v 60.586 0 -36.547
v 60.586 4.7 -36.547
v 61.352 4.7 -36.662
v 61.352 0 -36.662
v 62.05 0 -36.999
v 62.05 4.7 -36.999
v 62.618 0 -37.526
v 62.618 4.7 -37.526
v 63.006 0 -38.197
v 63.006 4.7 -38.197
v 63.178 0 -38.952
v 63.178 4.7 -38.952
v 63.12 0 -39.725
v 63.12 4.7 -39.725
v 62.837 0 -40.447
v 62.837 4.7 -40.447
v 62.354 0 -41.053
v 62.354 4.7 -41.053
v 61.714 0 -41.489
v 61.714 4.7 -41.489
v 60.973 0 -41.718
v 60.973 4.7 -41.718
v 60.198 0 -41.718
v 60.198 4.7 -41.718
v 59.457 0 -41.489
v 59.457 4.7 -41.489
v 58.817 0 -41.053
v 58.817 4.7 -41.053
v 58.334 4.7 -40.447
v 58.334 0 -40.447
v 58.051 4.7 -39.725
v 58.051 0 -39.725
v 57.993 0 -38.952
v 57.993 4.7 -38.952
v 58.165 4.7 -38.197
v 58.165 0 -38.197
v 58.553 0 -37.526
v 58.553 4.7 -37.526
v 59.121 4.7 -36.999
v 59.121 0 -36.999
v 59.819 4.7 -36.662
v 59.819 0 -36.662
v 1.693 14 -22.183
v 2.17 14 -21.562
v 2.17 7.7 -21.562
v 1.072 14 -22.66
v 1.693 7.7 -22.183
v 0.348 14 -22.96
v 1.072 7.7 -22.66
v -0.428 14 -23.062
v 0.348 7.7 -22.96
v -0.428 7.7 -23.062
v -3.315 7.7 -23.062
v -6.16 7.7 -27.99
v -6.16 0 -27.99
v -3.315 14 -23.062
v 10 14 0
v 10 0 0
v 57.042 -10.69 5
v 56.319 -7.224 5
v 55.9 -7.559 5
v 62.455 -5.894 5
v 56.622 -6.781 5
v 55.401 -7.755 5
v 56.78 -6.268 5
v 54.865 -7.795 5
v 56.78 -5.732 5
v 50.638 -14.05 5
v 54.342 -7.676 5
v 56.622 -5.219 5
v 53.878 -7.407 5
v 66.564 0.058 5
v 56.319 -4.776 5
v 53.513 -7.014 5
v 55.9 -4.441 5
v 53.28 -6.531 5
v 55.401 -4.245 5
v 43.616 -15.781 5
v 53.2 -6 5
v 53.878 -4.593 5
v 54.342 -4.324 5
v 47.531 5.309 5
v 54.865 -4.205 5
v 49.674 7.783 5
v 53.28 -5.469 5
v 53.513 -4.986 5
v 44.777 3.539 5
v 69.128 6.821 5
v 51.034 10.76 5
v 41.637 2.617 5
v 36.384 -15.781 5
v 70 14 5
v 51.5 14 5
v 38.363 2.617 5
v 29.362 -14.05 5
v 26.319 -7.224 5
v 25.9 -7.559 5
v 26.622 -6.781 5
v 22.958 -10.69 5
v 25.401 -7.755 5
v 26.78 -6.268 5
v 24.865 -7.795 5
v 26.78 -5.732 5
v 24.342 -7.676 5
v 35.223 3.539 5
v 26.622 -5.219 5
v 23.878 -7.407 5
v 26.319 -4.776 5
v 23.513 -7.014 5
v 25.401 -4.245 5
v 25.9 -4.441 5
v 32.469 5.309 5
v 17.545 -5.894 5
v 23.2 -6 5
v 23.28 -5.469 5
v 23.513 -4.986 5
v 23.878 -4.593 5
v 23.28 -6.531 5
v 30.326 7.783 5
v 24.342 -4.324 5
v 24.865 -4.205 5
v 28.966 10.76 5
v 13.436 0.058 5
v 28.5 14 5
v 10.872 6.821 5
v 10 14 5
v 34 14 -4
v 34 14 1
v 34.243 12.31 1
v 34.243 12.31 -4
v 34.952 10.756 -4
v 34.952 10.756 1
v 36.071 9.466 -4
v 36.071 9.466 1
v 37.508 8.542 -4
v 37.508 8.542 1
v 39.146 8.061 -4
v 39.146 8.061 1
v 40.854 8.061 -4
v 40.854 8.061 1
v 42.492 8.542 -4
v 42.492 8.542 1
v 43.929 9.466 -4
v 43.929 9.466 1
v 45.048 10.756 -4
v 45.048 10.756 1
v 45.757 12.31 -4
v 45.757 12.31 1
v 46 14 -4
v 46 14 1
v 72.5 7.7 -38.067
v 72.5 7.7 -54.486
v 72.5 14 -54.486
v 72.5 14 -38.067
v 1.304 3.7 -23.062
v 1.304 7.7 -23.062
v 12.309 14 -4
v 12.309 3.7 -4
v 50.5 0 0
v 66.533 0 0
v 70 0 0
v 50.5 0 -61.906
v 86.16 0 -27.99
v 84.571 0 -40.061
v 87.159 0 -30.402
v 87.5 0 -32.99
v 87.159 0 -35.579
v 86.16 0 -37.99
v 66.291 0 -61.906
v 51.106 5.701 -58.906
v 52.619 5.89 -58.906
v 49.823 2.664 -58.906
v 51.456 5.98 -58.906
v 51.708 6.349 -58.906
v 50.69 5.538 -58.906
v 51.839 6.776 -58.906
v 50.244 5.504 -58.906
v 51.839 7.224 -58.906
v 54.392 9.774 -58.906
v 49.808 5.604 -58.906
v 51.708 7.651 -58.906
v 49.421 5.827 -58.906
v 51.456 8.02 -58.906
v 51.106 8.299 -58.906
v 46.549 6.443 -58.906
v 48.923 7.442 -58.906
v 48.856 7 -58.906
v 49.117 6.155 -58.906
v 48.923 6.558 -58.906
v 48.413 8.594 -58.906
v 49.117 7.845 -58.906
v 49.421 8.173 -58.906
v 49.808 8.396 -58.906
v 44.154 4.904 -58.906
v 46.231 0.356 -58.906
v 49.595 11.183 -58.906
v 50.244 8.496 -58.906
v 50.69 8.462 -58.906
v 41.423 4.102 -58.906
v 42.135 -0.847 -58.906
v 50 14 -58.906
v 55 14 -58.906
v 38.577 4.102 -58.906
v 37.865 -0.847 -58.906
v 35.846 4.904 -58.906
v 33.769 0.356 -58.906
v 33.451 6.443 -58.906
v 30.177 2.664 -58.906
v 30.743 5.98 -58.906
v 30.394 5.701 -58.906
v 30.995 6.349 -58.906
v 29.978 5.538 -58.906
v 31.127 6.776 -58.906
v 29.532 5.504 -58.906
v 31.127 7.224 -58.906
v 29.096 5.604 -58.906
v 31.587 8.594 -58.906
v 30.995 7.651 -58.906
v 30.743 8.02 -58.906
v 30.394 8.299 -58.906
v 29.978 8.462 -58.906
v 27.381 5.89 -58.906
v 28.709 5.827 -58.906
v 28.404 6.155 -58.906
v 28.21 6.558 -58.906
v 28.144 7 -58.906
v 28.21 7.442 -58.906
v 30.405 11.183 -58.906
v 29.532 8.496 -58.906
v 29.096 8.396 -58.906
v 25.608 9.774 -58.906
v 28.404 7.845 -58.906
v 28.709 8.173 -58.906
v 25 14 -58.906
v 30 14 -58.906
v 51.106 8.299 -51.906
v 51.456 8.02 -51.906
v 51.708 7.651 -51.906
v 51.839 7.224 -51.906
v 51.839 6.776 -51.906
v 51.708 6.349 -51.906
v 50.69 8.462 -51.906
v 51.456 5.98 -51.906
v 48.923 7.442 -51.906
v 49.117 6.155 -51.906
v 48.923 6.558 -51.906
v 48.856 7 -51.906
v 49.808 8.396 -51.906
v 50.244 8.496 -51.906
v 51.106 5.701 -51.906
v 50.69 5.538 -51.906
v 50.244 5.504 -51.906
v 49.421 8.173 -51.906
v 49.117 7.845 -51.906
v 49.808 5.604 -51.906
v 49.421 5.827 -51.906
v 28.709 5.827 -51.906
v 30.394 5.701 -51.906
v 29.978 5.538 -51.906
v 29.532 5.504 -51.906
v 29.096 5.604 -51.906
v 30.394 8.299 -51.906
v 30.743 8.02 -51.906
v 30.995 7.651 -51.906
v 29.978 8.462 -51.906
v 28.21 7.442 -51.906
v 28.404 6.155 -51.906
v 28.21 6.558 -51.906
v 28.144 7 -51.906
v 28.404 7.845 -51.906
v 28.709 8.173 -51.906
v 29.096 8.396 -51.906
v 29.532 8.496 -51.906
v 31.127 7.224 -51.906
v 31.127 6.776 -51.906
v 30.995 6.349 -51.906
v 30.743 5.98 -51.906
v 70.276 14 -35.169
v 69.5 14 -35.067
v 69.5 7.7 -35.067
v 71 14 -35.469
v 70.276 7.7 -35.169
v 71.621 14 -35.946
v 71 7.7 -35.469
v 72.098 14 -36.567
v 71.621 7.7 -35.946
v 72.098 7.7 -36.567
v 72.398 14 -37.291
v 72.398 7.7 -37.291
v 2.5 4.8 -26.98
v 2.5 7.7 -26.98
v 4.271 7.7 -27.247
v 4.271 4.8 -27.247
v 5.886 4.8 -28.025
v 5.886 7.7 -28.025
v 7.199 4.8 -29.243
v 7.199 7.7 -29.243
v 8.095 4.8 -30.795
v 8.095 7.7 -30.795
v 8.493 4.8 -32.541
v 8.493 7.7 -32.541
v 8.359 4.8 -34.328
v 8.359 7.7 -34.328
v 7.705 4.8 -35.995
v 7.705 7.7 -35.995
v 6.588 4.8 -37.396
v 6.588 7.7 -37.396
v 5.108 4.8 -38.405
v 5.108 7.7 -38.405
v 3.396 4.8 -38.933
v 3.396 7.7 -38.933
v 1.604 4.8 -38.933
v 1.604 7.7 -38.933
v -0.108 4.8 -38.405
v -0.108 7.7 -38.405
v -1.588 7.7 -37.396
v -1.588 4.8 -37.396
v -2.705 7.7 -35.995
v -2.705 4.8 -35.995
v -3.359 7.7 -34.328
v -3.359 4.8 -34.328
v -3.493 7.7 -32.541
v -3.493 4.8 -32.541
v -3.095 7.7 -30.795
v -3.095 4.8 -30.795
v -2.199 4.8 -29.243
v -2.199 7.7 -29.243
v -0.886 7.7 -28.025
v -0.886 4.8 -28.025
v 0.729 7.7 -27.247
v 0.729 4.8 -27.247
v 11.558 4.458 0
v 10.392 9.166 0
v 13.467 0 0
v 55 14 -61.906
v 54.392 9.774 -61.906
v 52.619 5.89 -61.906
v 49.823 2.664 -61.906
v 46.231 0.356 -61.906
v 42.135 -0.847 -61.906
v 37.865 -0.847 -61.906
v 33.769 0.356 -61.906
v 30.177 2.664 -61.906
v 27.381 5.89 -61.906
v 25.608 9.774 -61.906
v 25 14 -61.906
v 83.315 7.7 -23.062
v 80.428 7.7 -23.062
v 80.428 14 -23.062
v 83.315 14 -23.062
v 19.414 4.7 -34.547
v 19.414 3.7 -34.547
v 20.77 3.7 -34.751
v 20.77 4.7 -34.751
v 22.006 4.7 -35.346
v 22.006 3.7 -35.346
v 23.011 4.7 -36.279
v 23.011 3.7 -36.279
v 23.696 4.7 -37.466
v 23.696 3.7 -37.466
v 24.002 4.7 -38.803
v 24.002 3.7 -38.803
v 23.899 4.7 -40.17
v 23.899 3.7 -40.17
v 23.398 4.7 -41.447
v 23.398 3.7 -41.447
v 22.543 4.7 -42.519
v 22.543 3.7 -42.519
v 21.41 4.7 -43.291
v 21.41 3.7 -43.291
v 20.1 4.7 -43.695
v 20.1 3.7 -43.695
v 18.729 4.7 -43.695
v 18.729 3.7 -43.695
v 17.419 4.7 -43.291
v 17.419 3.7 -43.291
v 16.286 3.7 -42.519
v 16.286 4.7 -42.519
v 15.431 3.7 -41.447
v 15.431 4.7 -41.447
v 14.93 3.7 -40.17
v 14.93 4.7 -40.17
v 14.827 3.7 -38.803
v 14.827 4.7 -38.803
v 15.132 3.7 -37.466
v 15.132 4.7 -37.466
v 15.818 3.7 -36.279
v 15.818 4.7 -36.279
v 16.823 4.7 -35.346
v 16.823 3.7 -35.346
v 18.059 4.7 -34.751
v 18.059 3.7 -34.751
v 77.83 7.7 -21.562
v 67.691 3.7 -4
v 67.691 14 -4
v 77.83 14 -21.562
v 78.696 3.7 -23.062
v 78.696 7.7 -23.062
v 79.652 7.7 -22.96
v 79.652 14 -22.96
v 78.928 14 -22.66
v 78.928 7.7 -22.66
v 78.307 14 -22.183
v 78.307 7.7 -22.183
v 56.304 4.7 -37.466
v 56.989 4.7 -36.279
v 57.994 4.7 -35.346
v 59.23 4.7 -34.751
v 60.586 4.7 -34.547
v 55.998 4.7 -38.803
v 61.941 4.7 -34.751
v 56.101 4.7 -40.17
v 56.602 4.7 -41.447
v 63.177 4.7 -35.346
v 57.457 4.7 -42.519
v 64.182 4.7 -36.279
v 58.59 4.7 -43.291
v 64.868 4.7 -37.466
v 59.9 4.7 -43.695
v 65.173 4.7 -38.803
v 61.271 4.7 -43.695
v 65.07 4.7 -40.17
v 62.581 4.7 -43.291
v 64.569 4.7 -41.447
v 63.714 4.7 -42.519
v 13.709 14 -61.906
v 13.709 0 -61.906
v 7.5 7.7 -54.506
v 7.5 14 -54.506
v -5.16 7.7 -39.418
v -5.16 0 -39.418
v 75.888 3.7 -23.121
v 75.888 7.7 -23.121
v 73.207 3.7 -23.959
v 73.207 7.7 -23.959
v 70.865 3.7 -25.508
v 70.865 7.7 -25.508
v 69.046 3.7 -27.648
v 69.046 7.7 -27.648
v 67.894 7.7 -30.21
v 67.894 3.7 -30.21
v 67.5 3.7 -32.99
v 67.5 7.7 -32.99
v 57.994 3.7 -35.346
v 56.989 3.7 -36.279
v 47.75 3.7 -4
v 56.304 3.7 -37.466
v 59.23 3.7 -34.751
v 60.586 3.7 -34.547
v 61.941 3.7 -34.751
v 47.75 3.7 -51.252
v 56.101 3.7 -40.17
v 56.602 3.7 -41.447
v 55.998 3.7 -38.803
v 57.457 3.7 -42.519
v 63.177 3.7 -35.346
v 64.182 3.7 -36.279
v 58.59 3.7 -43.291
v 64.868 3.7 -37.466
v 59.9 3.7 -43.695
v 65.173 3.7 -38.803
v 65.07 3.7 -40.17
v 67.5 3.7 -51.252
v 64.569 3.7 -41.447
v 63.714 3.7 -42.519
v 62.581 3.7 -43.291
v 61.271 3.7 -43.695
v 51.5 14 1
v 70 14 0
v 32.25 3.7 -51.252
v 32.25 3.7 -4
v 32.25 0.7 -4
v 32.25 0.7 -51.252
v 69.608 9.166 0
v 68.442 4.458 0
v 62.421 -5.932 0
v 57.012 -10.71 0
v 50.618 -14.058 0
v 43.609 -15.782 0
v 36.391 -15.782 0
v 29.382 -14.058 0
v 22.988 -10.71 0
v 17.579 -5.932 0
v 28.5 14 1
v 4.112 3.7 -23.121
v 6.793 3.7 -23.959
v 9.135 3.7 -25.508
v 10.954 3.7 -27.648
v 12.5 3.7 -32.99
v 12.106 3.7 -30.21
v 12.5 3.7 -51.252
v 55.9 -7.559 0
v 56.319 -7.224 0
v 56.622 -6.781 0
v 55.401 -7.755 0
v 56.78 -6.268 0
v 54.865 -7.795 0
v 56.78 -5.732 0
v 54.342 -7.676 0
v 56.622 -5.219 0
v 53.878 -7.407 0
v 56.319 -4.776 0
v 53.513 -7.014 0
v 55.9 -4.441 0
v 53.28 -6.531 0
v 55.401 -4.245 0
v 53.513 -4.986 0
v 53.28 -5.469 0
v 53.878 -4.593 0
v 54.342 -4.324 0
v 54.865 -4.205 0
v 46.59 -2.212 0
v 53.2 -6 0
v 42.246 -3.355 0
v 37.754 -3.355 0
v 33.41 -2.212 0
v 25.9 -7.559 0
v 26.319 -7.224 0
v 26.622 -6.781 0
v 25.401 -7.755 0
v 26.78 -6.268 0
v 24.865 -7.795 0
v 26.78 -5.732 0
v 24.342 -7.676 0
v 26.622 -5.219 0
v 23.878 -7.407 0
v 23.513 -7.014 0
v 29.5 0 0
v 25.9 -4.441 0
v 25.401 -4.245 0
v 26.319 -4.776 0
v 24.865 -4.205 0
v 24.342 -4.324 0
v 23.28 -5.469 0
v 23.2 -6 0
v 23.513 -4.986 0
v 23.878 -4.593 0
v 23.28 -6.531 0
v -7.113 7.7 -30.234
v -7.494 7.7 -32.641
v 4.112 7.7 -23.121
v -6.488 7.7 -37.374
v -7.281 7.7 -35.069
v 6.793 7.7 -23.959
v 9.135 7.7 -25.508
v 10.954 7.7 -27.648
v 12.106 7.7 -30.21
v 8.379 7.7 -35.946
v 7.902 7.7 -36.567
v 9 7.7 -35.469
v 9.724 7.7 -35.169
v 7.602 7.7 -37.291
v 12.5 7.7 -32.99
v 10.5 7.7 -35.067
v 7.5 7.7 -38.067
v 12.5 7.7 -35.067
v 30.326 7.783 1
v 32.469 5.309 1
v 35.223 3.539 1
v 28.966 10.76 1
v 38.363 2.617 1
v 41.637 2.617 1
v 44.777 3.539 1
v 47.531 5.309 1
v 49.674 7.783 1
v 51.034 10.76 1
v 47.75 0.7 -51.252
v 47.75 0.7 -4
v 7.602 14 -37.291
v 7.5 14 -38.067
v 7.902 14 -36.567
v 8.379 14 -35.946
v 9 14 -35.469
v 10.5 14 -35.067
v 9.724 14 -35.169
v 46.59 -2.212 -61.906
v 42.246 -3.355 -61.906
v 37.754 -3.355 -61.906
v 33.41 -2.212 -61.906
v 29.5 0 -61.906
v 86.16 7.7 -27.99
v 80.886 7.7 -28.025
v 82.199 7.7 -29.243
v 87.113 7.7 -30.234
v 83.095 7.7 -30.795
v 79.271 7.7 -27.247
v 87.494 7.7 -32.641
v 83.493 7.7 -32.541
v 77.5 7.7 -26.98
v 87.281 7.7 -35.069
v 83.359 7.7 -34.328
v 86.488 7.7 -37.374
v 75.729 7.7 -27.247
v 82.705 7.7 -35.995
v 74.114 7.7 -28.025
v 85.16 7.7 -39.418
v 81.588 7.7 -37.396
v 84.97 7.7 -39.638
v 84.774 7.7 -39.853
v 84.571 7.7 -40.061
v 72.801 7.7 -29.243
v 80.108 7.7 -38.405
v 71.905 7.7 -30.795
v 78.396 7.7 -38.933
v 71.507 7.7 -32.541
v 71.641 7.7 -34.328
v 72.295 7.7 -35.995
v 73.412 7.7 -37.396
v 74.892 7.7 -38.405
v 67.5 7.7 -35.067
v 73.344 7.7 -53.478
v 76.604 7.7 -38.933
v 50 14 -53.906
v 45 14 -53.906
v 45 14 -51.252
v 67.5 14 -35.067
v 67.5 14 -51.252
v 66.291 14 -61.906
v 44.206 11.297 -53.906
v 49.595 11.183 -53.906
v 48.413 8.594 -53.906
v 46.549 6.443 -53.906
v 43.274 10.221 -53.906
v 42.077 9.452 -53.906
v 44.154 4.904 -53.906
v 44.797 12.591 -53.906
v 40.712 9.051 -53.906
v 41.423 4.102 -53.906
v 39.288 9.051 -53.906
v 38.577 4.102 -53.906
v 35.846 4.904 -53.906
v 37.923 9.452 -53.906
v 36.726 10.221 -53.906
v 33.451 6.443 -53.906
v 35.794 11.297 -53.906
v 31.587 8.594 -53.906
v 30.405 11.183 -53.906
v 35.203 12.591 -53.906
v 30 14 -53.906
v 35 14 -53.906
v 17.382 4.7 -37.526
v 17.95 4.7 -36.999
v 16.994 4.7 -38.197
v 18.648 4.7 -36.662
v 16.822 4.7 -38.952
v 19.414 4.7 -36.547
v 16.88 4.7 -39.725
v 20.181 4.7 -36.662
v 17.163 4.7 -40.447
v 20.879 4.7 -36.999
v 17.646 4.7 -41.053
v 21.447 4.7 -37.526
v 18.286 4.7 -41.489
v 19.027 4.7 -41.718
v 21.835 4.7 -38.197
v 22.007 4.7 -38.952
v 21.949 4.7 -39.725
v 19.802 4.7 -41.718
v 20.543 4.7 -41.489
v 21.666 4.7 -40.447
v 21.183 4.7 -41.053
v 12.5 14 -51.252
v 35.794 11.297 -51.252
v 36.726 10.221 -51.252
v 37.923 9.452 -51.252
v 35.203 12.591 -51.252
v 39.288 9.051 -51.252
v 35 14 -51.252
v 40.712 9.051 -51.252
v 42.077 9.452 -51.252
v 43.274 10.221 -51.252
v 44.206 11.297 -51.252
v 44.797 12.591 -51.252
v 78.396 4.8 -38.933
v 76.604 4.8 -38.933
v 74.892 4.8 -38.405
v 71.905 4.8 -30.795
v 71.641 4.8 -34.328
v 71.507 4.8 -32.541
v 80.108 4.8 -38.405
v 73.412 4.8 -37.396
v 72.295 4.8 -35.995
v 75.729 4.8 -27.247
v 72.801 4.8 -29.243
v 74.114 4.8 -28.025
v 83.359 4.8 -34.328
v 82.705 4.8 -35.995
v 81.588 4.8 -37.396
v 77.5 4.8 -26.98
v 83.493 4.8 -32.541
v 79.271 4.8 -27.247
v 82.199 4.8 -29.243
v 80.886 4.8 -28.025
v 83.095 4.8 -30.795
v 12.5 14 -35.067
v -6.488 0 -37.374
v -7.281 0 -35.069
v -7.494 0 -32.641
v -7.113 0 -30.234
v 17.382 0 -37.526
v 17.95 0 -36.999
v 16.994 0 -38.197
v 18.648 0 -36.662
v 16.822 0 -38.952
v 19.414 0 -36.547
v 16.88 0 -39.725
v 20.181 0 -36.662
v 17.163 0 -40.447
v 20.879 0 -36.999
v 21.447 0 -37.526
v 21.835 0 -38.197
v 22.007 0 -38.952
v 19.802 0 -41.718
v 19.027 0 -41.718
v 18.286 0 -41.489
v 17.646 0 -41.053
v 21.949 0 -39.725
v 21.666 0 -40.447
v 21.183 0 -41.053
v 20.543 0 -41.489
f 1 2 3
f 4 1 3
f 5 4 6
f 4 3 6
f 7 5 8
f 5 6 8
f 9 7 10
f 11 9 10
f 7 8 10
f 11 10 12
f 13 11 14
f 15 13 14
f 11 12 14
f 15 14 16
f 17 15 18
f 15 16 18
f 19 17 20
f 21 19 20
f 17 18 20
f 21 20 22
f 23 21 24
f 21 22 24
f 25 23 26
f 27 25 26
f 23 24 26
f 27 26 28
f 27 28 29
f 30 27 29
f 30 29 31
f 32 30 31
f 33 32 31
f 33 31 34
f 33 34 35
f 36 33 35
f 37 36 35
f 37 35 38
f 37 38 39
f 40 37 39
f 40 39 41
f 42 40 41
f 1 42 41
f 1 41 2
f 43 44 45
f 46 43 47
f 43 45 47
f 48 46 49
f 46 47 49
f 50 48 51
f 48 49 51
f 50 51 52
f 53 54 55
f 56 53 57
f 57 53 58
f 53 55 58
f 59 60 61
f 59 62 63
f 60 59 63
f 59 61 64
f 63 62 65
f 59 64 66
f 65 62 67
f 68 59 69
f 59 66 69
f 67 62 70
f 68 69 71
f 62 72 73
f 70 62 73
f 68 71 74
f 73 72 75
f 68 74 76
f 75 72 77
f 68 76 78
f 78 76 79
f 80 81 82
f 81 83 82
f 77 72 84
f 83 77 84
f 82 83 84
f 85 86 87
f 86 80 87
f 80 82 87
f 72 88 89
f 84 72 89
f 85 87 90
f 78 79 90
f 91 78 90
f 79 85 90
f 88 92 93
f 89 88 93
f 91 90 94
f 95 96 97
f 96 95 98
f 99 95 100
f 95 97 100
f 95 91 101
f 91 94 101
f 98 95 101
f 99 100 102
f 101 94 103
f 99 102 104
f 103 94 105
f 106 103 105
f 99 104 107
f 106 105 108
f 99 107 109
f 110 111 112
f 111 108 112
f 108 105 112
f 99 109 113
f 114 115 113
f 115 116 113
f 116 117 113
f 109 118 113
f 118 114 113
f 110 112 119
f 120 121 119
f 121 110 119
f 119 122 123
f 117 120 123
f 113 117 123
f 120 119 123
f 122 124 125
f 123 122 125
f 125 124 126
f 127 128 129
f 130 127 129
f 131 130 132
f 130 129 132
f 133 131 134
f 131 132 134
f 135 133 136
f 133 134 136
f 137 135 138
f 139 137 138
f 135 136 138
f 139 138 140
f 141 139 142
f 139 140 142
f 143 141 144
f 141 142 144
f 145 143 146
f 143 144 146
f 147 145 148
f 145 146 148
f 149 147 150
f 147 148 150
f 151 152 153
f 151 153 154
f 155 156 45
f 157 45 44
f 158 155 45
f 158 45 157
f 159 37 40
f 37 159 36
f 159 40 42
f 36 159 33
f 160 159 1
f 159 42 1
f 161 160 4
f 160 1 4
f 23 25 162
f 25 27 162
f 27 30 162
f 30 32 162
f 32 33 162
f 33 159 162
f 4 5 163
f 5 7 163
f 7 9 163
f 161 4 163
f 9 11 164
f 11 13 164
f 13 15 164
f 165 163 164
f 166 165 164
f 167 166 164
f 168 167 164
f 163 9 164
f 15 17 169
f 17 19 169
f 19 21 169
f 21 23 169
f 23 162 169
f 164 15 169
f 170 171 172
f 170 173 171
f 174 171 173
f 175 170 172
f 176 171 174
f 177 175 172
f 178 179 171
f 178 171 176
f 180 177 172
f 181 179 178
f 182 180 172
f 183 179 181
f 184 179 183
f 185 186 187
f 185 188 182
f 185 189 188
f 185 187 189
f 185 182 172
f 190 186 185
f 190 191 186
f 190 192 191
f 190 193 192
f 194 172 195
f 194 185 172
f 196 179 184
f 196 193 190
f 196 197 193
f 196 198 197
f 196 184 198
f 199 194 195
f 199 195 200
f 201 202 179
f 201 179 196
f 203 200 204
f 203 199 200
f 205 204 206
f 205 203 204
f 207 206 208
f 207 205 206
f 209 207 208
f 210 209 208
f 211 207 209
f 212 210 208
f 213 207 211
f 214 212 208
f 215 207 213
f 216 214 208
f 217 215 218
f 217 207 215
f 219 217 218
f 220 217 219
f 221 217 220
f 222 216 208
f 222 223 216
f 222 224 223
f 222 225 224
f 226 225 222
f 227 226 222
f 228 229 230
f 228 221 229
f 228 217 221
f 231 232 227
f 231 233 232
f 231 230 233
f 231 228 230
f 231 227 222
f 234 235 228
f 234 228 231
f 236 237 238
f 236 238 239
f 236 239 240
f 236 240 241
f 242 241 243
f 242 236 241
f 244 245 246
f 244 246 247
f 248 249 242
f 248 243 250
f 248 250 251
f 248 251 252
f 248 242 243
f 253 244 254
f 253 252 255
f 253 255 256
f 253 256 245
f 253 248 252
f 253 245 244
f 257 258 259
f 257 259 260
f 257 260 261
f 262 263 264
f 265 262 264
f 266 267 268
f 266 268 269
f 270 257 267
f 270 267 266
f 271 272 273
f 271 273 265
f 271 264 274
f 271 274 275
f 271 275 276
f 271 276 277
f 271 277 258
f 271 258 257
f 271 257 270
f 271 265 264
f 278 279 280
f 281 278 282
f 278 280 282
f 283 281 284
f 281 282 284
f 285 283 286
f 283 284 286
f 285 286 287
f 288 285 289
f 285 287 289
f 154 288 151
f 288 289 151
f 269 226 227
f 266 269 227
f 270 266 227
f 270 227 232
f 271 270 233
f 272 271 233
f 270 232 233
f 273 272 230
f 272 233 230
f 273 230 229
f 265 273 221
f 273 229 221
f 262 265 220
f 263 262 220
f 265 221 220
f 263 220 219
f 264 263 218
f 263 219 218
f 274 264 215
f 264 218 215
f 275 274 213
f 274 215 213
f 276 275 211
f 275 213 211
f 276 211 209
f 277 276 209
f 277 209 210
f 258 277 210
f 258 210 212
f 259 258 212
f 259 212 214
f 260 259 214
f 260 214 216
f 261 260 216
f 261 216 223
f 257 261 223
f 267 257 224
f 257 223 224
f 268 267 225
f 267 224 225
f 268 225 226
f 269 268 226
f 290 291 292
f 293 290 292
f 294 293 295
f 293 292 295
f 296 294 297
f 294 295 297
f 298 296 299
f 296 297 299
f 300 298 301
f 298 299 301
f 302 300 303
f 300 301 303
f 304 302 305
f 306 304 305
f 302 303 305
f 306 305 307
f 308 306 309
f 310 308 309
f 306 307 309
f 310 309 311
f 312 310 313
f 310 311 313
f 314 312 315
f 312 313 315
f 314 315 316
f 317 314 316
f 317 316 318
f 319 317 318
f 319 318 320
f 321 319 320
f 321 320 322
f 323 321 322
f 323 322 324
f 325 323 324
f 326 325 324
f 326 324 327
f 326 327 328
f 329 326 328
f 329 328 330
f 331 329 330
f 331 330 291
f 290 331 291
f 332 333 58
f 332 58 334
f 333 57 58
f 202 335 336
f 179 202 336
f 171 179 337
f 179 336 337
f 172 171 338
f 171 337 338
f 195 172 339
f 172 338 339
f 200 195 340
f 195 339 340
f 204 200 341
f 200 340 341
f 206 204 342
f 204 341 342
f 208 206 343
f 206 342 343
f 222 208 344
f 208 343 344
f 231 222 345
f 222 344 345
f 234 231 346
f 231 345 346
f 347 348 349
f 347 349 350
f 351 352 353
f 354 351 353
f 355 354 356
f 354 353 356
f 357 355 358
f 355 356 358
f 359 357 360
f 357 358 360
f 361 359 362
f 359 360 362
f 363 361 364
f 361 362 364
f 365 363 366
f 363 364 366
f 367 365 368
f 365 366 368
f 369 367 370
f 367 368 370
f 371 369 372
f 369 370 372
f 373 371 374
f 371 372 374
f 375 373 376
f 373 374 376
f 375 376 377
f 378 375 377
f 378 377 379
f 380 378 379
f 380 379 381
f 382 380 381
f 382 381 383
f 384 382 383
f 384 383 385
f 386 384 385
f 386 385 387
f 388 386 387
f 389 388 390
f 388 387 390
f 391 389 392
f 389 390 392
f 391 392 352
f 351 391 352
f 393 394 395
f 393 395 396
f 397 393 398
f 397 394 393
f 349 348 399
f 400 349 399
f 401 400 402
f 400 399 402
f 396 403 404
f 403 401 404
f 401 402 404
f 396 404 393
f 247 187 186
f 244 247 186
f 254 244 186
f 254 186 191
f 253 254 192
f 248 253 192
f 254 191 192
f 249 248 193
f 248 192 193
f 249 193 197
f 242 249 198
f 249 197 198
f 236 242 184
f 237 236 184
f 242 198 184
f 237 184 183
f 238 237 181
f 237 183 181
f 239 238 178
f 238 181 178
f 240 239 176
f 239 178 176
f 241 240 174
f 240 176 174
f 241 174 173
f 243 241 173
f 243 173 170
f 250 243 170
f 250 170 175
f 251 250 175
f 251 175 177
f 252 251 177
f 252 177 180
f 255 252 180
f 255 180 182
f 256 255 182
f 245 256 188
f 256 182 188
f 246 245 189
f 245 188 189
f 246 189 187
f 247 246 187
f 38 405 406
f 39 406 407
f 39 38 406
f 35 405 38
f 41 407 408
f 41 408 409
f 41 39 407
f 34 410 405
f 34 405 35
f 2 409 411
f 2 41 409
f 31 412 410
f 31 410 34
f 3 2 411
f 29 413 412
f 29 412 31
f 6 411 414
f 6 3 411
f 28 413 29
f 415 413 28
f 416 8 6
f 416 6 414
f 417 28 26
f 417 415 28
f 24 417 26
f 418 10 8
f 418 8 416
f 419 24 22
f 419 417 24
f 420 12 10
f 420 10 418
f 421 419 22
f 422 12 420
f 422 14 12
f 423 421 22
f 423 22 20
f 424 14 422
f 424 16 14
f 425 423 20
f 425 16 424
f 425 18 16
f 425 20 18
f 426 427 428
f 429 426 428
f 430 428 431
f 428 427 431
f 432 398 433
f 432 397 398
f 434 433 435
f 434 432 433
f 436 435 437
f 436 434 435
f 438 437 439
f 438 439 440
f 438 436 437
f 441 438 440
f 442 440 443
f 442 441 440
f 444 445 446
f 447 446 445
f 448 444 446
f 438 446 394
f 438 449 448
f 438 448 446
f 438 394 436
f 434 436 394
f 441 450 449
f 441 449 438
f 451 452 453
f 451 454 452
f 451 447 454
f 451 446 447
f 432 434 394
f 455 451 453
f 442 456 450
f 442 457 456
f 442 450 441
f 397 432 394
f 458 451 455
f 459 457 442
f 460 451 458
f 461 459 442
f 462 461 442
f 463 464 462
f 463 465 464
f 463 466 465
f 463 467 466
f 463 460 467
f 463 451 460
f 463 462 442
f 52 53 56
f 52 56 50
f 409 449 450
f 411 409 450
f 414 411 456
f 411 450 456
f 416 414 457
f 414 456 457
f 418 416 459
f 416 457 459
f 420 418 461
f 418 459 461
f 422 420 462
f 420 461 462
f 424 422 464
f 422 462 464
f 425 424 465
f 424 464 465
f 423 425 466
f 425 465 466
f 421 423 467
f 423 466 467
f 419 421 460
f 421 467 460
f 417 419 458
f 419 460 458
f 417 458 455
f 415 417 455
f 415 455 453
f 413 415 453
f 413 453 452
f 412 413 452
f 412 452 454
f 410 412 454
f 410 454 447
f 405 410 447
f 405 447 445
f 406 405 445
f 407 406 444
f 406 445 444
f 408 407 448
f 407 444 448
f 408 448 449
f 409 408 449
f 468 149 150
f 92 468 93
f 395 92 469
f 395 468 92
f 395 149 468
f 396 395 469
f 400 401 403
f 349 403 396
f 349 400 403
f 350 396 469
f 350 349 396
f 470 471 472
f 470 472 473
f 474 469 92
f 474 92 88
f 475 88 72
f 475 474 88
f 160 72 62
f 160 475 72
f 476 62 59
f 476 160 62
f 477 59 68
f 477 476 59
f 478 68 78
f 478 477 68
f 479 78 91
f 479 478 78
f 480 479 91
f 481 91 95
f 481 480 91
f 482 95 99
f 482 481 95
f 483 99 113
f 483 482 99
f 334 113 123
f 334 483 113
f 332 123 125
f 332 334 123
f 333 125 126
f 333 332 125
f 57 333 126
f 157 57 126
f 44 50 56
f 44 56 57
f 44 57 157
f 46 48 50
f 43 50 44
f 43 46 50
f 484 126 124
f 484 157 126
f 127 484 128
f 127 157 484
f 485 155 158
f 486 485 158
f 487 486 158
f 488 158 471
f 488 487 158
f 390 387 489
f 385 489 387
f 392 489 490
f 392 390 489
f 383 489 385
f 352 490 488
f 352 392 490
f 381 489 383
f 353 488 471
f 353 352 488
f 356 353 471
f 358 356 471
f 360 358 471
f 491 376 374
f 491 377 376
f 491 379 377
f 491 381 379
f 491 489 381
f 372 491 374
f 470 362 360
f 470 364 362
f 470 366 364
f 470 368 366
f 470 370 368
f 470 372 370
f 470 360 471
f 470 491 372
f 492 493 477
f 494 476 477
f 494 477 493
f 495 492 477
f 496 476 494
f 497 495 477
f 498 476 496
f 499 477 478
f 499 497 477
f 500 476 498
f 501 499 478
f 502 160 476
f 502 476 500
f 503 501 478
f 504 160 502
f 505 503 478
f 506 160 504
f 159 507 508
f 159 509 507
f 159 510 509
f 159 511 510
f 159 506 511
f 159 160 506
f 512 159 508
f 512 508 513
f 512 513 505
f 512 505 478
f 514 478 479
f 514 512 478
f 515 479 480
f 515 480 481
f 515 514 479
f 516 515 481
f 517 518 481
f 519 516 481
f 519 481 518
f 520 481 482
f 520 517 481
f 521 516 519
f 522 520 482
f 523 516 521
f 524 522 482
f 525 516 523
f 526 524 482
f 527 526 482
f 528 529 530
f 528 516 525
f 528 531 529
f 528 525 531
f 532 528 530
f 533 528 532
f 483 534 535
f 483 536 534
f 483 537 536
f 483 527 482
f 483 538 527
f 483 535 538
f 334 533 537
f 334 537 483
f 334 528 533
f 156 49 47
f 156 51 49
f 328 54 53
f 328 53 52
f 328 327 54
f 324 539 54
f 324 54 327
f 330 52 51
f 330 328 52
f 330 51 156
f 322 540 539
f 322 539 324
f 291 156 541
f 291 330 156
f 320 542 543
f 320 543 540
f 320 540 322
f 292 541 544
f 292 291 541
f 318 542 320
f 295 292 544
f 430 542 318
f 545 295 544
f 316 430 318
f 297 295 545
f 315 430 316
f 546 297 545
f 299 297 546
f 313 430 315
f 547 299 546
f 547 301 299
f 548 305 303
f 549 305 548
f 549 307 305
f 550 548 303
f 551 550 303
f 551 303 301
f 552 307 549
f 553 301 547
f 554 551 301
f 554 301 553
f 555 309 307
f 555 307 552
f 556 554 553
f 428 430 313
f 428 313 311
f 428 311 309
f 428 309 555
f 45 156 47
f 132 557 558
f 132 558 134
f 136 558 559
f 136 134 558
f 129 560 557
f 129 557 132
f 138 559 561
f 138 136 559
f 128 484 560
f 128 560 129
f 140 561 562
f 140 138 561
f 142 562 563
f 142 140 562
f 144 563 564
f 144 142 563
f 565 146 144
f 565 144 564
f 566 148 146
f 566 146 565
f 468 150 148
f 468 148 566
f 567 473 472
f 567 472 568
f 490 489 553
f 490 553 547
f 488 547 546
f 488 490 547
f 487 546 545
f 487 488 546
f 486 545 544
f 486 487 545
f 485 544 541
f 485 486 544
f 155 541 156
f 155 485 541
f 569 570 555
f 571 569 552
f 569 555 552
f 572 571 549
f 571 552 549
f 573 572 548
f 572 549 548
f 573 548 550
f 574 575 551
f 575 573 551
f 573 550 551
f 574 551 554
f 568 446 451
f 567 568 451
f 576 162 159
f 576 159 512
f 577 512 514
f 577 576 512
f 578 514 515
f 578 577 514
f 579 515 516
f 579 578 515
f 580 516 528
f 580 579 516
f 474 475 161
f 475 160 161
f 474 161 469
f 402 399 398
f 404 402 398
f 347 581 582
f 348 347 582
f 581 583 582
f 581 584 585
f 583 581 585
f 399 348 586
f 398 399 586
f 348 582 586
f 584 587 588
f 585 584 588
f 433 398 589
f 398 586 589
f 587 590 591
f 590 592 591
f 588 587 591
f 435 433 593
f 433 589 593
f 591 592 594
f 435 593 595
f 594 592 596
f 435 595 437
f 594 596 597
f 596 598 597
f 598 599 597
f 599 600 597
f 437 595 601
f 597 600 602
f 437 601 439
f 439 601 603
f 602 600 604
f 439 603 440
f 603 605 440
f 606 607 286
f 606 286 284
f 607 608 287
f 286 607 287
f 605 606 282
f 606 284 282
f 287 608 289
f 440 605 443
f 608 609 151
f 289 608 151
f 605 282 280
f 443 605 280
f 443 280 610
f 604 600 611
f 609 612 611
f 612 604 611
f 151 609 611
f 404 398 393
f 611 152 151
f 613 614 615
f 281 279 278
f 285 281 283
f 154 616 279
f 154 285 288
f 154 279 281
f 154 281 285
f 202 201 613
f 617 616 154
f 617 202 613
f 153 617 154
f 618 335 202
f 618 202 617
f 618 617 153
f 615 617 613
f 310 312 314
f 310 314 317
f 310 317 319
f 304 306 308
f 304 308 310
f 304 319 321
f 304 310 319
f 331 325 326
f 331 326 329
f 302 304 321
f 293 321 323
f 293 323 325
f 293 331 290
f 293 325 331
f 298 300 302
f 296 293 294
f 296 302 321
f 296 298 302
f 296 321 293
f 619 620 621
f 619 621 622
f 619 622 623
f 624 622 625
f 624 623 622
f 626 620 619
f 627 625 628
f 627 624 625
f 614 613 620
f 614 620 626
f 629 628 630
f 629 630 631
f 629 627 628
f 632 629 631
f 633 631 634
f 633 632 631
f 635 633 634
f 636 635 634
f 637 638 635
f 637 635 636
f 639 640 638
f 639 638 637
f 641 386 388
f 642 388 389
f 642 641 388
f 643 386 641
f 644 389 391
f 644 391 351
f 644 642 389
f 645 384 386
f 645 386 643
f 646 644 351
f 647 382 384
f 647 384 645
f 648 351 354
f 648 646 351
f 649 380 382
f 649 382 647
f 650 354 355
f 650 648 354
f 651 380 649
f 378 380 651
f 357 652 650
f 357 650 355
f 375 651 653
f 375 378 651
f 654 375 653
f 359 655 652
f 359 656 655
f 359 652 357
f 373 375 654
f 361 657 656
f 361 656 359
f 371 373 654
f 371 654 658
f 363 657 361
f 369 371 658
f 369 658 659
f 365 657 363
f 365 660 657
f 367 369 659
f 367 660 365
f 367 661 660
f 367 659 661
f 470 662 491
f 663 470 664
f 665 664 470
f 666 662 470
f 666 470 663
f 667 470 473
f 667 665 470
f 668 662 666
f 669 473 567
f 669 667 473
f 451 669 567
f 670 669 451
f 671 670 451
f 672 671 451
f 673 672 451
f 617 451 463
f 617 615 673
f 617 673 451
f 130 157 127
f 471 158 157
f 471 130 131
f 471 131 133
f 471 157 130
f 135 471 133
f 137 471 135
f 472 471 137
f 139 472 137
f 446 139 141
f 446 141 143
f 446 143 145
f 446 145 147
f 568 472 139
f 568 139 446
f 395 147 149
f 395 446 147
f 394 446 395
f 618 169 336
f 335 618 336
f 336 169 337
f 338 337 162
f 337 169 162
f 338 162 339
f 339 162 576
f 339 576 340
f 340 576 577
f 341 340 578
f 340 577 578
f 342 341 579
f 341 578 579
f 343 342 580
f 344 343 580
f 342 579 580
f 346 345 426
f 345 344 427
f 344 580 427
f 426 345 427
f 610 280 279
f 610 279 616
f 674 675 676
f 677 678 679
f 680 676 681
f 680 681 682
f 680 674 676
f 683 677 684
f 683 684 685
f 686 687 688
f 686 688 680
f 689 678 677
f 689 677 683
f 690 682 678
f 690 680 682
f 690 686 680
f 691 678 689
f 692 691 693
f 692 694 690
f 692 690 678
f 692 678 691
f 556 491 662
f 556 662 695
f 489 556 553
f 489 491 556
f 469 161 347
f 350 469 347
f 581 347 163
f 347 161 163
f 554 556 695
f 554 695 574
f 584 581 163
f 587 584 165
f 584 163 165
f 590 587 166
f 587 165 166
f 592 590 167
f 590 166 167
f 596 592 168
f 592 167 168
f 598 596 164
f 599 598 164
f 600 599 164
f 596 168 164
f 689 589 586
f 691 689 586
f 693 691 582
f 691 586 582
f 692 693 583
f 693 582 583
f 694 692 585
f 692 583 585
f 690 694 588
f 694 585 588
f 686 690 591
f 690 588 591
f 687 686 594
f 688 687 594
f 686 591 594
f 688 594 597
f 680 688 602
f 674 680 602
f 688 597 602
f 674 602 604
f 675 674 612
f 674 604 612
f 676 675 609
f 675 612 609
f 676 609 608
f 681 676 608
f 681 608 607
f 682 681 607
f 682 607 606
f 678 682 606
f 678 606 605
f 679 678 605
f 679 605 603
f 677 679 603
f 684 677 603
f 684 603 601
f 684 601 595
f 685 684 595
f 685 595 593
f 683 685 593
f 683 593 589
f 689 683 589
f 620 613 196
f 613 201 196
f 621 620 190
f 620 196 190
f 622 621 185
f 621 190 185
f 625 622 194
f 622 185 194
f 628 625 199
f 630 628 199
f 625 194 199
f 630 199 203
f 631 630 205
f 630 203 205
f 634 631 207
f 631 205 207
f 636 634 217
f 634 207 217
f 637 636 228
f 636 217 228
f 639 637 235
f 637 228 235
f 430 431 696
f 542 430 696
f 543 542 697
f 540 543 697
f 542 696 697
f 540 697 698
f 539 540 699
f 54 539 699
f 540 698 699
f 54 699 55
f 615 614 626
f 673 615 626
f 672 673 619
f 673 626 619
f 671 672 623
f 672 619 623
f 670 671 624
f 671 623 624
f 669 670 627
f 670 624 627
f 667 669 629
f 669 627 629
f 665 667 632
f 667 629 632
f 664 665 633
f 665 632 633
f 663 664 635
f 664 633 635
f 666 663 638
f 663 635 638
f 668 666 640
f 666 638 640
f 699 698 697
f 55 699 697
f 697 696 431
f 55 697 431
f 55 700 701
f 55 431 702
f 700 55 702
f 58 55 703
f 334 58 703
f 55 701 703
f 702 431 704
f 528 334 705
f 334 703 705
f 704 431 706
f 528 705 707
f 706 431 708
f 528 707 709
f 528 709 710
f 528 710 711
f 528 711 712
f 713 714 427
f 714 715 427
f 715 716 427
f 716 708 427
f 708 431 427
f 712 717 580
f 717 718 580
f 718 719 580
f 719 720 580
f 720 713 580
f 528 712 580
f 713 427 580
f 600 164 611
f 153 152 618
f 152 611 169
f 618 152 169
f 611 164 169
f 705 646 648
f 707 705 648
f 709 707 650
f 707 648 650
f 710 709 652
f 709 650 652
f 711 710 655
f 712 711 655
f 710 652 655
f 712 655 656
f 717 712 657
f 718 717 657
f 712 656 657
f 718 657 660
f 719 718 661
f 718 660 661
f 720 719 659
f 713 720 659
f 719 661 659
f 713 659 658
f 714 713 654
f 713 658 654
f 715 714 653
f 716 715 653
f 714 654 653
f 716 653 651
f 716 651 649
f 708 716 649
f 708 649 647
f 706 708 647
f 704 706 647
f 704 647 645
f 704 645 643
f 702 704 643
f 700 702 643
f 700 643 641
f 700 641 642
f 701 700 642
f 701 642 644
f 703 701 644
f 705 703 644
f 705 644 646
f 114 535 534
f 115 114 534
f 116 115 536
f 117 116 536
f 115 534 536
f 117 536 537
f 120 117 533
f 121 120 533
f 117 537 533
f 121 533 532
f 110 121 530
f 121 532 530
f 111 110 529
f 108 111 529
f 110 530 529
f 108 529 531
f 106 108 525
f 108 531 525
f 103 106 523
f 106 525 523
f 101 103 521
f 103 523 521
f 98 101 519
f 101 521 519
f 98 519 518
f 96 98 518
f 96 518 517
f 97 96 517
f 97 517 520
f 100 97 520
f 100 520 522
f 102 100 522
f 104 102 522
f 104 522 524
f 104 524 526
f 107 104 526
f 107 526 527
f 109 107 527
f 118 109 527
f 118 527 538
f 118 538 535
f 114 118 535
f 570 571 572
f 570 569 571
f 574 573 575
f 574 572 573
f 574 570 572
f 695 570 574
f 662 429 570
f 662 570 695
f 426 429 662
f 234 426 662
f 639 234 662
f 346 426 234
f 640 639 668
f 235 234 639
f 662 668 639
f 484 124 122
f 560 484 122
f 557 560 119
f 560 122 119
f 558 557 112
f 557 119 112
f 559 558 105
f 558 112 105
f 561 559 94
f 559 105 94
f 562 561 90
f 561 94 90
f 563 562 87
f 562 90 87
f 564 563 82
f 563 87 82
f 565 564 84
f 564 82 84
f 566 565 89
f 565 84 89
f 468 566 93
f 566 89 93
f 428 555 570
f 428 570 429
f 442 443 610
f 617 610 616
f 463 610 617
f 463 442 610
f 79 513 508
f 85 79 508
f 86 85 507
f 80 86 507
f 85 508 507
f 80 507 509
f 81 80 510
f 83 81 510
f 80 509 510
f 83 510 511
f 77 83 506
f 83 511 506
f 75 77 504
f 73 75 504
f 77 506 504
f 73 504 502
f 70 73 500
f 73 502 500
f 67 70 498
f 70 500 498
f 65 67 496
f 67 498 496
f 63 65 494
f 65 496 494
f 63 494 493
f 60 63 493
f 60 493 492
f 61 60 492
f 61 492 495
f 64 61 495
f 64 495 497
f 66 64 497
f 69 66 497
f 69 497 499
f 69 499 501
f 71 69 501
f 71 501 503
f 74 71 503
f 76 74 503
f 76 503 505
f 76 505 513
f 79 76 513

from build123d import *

# Parameters (mm, degrees)
EXTRUDE_1_DEPTH      = 14
CUT_EXTRUDE_START    = -6.3
CUT_EXTRUDE_1_DEPTH  = 6.3
CUT_EXTRUDE_START_2  = -3
CUT_EXTRUDE_2_DEPTH  = 3
SKETCH_4_R           = 6.01
CUT_EXTRUDE_3_DEPTH  = 2.9
CUT_EXTRUDE_4_REACH  = 109.588
SKETCH_5_R           = 2.6
CUT_EXTRUDE_START_3  = -1
SKETCH_6_R           = 4.6
CUT_EXTRUDE_6_DEPTH  = 1
EXTRUDE_2_DEPTH      = 5
SKETCH_8_R           = 11.5
CUT_EXTRUDE_7_DEPTH  = 4
CUT_EXTRUDE_8_REACH  = 110.373
SKETCH_9_R           = 1.8
FILLET_1_R           = 3
SKETCH_12_R          = 10
CUT_EXTRUDE_10_DEPTH = 8
EXTRUDE_3_DEPTH      = 61.90646084
SKETCH_19_R          = 6
CUT_EXTRUDE_14_DEPTH = 9
CUT_EXTRUDE_11_REACH = 108.687
SKETCH_13_R          = 5
SKETCH_21_R          = 15
CUT_EXTRUDE_15_DEPTH = 3
SKETCH_23_R          = 1.5
CUT_EXTRUDE_16_DEPTH = 7
CUT_EXTRUDE_START_4  = -5
CUT_EXTRUDE_19_DEPTH = 5
SKETCH_34_W          = 15.5
SKETCH_34_H          = 47.251878887
CUT_EXTRUDE_20_DEPTH = 3


with BuildPart() as part:
    # 草图1 → 凸台-拉伸1 (new body)
    with BuildSketch(Plane(origin=(0, 0, 0), x_dir=(1, 0, 0), z_dir=(0, 1, 0))):
        with BuildLine():
            Line((13.709398988, 61.90646084), (-5.160444431, 39.418257154))
            ThreePointArc((-5.160444431, 39.418257154), (-7.461946981, 33.861938484), (-6.160254038, 27.990381057))
            Line((-6.160254038, 27.990381057), (10, 0))
            Line((10, 0), (70, 0))
            Line((70, 0), (86.160254038, 27.990381057))
            ThreePointArc((86.160254038, 27.990381057), (87.414448614, 34.295642979), (84.571067812, 40.061448869))
            Line((84.571067812, 40.061448869), (66.290601012, 61.90646084))
            Line((66.290601012, 61.90646084), (13.709398988, 61.90646084))
        make_face()
    extrude(amount=EXTRUDE_1_DEPTH)

    # 草图2 → 切除-拉伸1 (cut)
    with BuildSketch(Plane(origin=(0, 14, 0), x_dir=(1, 0, 0), z_dir=(0, 1, 0)).offset(CUT_EXTRUDE_START)):
        with BuildLine():
            Line((-3.314954576, 23.062177826), (1.303847577, 23.062177826))
            Line((1.303847577, 23.062177826), (12.309401077, 4))
            Line((12.309401077, 4), (67.690598923, 4))
            Line((67.690598923, 4), (78.696152423, 23.062177826))
            Line((78.696152423, 23.062177826), (83.314954576, 23.062177826))
            Line((83.314954576, 23.062177826), (86.160254038, 27.990381057))
            ThreePointArc((86.160254038, 27.990381057), (87.461946981, 33.861938484), (85.160444431, 39.418257154))
            ThreePointArc((85.160444431, 39.418257154), (84.872773368, 39.746283133), (84.571067812, 40.061448869))
            Line((84.571067812, 40.061448869), (73.343672408, 53.478096796))
            Line((73.343672408, 53.478096796), (72.5, 54.486278592))
            Line((72.5, 54.486278592), (72.5, 35.067052168))
            Line((72.5, 35.067052168), (67.5, 35.067052168))
            Line((67.5, 35.067052168), (67.5, 46.251878887))
            Line((67.5, 46.251878887), (12.5, 46.251878887))
            Line((12.5, 46.251878887), (12.5, 35.067052168))
            Line((12.5, 35.067052168), (7.5, 35.067052168))
            Line((7.5, 35.067052168), (7.5, 54.506387288))
            Line((7.5, 54.506387288), (-5.160444431, 39.418257154))
            ThreePointArc((-5.160444431, 39.418257154), (-7.461946981, 33.861938484), (-6.160254038, 27.990381057))
            Line((-6.160254038, 27.990381057), (-3.314954576, 23.062177826))
        make_face()
    extrude(amount=CUT_EXTRUDE_1_DEPTH, mode=Mode.SUBTRACT)

    # 草图3 → 切除-拉伸2 (cut)
    with BuildSketch(Plane(origin=(0, 7.7, 0), x_dir=(1, 0, 0), z_dir=(0, 1, 0)).offset(CUT_EXTRUDE_START_2)):
        with BuildLine():
            Line((67.690598923, 4), (78.696152423, 23.062177826))
            ThreePointArc((78.696152423, 23.062177826), (70.865300468, 25.508351779), (67.5, 32.990381057))
            Line((67.5, 32.990381057), (67.5, 35.067052168))
            Line((67.5, 35.067052168), (67.5, 46.251878887))
            Line((67.5, 46.251878887), (12.5, 46.251878887))
            Line((12.5, 46.251878887), (12.5, 35.067052168))
            Line((12.5, 35.067052168), (12.5, 32.990381057))
            ThreePointArc((12.5, 32.990381057), (9.134699532, 25.508351779), (1.303847577, 23.062177826))
            Line((1.303847577, 23.062177826), (12.309401077, 4))
            Line((12.309401077, 4), (67.690598923, 4))
        make_face()
    extrude(amount=CUT_EXTRUDE_2_DEPTH, mode=Mode.SUBTRACT)

    # 草图4 → 切除-拉伸3 (cut)
    with BuildSketch(Plane(origin=(0, 7.7, 0), x_dir=(1, 0, 0), z_dir=(0, 1, 0))):
        with Locations(Location((2.5, 32.990381057, 0), (0, 0, 270))):
            Circle(SKETCH_4_R)
        with Locations(Location((77.5, 32.990381057, 0), (0, 0, 270))):
            Circle(SKETCH_4_R)
    extrude(amount=-CUT_EXTRUDE_3_DEPTH, mode=Mode.SUBTRACT)

    # 草图5 → 切除-拉伸4 (cut, up to next)
    with BuildSketch(Plane(origin=(0, 4.7, 0), x_dir=(1, 0, 0), z_dir=(0, 1, 0)), mode=Mode.PRIVATE) as cut_extrude_4_sk1:
        with Locations(Location((19.414467174, 39.146743637, 0), (0, 0, 270))):
            Circle(SKETCH_5_R)
    cut_extrude_4_tool1 = extrude(cut_extrude_4_sk1.sketch, amount=-CUT_EXTRUDE_4_REACH, mode=Mode.PRIVATE) & part.part
    # 草图5 → 切除-拉伸4 (cut, up to next)
    with BuildSketch(Plane(origin=(0, 4.7, 0), x_dir=(1, 0, 0), z_dir=(0, 1, 0)), mode=Mode.PRIVATE) as cut_extrude_4_sk2:
        with Locations(Location((60.585532826, 39.146743637, 0), (0, 0, 270))):
            Circle(SKETCH_5_R)
    cut_extrude_4_tool2 = extrude(cut_extrude_4_sk2.sketch, amount=-CUT_EXTRUDE_4_REACH, mode=Mode.PRIVATE) & part.part
    add(cut_extrude_4_tool1.solids().sort_by_distance((19.414467, 4.7, -39.146744))[0], mode=Mode.SUBTRACT)
    add(cut_extrude_4_tool2.solids().sort_by_distance((60.585533, 4.7, -39.146744))[0], mode=Mode.SUBTRACT)

    # 草图6 → 切除-拉伸6 (cut)
    with BuildSketch(Plane(origin=(0, 4.7, 0), x_dir=(1, 0, 0), z_dir=(0, 1, 0)).offset(CUT_EXTRUDE_START_3)):
        with BuildLine():
            Line((67.690598923, 4), (78.696152423, 23.062177826))
            ThreePointArc((78.696152423, 23.062177826), (70.865300468, 25.508351779), (67.5, 32.990381057))
            Line((67.5, 32.990381057), (67.5, 46.251878887))
            Line((67.5, 46.251878887), (12.5, 46.251878887))
            Line((12.5, 46.251878887), (12.5, 32.990381057))
            ThreePointArc((12.5, 32.990381057), (9.134699532, 25.508351779), (1.303847577, 23.062177826))
            Line((1.303847577, 23.062177826), (12.309401077, 4))
            Line((12.309401077, 4), (67.690598923, 4))
        make_face()
        with Locations(Location((19.414467174, 39.146743637, 0), (0, 0, 270))):
            Circle(SKETCH_6_R, mode=Mode.SUBTRACT)
        with Locations(Location((60.585532826, 39.146743637, 0), (0, 0, 270))):
            Circle(SKETCH_6_R, mode=Mode.SUBTRACT)
    extrude(amount=CUT_EXTRUDE_6_DEPTH, mode=Mode.SUBTRACT)

    # 草图7 → 凸台-拉伸2 (add)
    with BuildSketch(Plane.XY):
        with BuildLine():
            Line((10, 14), (70, 14))
            ThreePointArc((70, 14), (40, -16), (10, 14))
        make_face()
    extrude(amount=EXTRUDE_2_DEPTH)

    # 草图8 → 切除-拉伸7 (cut)
    with BuildSketch(Plane.XY.offset(5)):
        with Locations((40, 14)):
            Circle(SKETCH_8_R)
    extrude(amount=-CUT_EXTRUDE_7_DEPTH, mode=Mode.SUBTRACT)

    # 草图9 → 切除-拉伸8 (cut, up to next)
    with BuildSketch(Plane(origin=(0, 0, 0), x_dir=(-1, 0, 0), z_dir=(0, 0, -1)), mode=Mode.PRIVATE) as cut_extrude_8_sk1:
        with Locations((-55, -6)):
            Circle(SKETCH_9_R)
    cut_extrude_8_tool1 = extrude(cut_extrude_8_sk1.sketch, amount=-CUT_EXTRUDE_8_REACH, mode=Mode.PRIVATE) & part.part
    # 草图9 → 切除-拉伸8 (cut, up to next)
    with BuildSketch(Plane(origin=(0, 0, 0), x_dir=(-1, 0, 0), z_dir=(0, 0, -1)), mode=Mode.PRIVATE) as cut_extrude_8_sk2:
        with Locations((-25, -6)):
            Circle(SKETCH_9_R)
    cut_extrude_8_tool2 = extrude(cut_extrude_8_sk2.sketch, amount=-CUT_EXTRUDE_8_REACH, mode=Mode.PRIVATE) & part.part
    add(cut_extrude_8_tool1.solids().sort_by_distance((55, -6, 0))[0], mode=Mode.SUBTRACT)
    add(cut_extrude_8_tool2.solids().sort_by_distance((25, -6, 0))[0], mode=Mode.SUBTRACT)

    # 圆角1
    # the kernel refuses this fillet: 3 mm, written as the material it takes off along each edge
    with BuildSketch(Plane(origin=(78.696152423, 7.7, -23.062177826), x_dir=(1, 0, 0), z_dir=(0, 1, 0))) as fillet_1_piece_1:
        with BuildLine():
            CenterArc((FILLET_1_R * 0.57735026919, -FILLET_1_R), FILLET_1_R, 90, 60)
            Line((-FILLET_1_R * 0.288675134595, -FILLET_1_R * 0.5), (0, 0))
            Line((0, 0), (FILLET_1_R * 0.57735026919, 0))
        make_face()
    extrude(amount=10.630127019, mode=Mode.SUBTRACT)
    with BuildSketch(Plane(origin=(1.303847577, 7.7, -23.062177826), x_dir=(-1, 0, 0), z_dir=(0, 1, 0))) as fillet_1_piece_2:
        with BuildLine():
            CenterArc((FILLET_1_R * 0.57735026919, FILLET_1_R), FILLET_1_R, 210, 60)
            Line((-FILLET_1_R * 0.288675134595, FILLET_1_R * 0.5), (0, 0))
            Line((0, 0), (FILLET_1_R * 0.57735026919, 0))
        make_face()
    extrude(amount=10.630127019, mode=Mode.SUBTRACT)
    with BuildSketch(Plane(origin=(7.5, 7.7, -35.067052168), x_dir=(0, 0, -1), z_dir=(0, 1, 0))) as fillet_1_piece_3:
        with BuildLine():
            CenterArc((FILLET_1_R, -FILLET_1_R), FILLET_1_R, 90, 90)
            Line((0, -FILLET_1_R), (0, 0))
            Line((0, 0), (FILLET_1_R, 0))
        make_face()
    extrude(amount=13.8, mode=Mode.SUBTRACT)
    with BuildSketch(Plane(origin=(72.5, 7.7, -35.067052168), x_dir=(0, 0, -1), z_dir=(0, 1, 0))) as fillet_1_piece_4:
        with BuildLine():
            CenterArc((FILLET_1_R, FILLET_1_R), FILLET_1_R, 180, 90)
            Line((0, FILLET_1_R), (0, 0))
            Line((0, 0), (FILLET_1_R, 0))
        make_face()
    extrude(amount=13.8, mode=Mode.SUBTRACT)

    # 草图12 → 切除-拉伸10 (cut)
    with BuildSketch(Plane(origin=(0, 0, -61.90646084), x_dir=(-1, 0, 0), z_dir=(0, 0, -1))):
        with Locations((-40, 14)):
            Circle(SKETCH_12_R)
    extrude(amount=-CUT_EXTRUDE_10_DEPTH, mode=Mode.SUBTRACT)

    # 草图16 → 凸台-拉伸3 (add)
    with BuildSketch(Plane(origin=(0, 0, -61.90646084), x_dir=(-1, 0, 0), z_dir=(0, 0, -1))):
        with BuildLine():
            ThreePointArc((-50.5, 0), (-40, -3.5), (-29.5, 0))
            Line((-29.5, 0), (-50.5, 0))
        make_face()
    extrude(amount=-EXTRUDE_3_DEPTH)

    # 草图19 → 切除-拉伸14 (cut)
    with BuildSketch(Plane.XY.offset(5)):
        with Locations((40, 14)):
            Circle(SKETCH_19_R)
    extrude(amount=-CUT_EXTRUDE_14_DEPTH, mode=Mode.SUBTRACT)

    # 草图13 → 切除-拉伸11 (cut, up to next)
    with BuildSketch(Plane(origin=(0, 0, -53.90646084), x_dir=(-1, 0, 0), z_dir=(0, 0, -1)), mode=Mode.PRIVATE) as cut_extrude_11_sk1:
        with Locations((-40, 14)):
            Circle(SKETCH_13_R)
    cut_extrude_11_tool1 = extrude(cut_extrude_11_sk1.sketch, amount=-CUT_EXTRUDE_11_REACH, mode=Mode.PRIVATE) & part.part
    add(cut_extrude_11_tool1.solids().sort_by_distance((40, 14, -53.906461))[0], mode=Mode.SUBTRACT)

    # 草图21 → 切除-拉伸15 (cut)
    with BuildSketch(Plane(origin=(0, 0, -61.90646084), x_dir=(-1, 0, 0), z_dir=(0, 0, -1))):
        with Locations((-40, 14)):
            Circle(SKETCH_21_R)
    extrude(amount=-CUT_EXTRUDE_15_DEPTH, mode=Mode.SUBTRACT)

    # 草图23 → 切除-拉伸16 (cut)
    with BuildSketch(Plane(origin=(0, 0, -58.90646084), x_dir=(-1, 0, 0), z_dir=(0, 0, -1))):
        with Locations((-50.356157589, 7)):
            Circle(SKETCH_23_R)
        with Locations((-29.643842411, 7)):
            Circle(SKETCH_23_R)
    extrude(amount=-CUT_EXTRUDE_16_DEPTH, mode=Mode.SUBTRACT)

    # 草图33 → 切除-拉伸19 (cut)
    with BuildSketch(Plane.XY.offset(-46.251878887).offset(CUT_EXTRUDE_START_4)):
        with BuildLine():
            Line((35, 14), (12.5, 14))
            Line((12.5, 14), (12.5, 3.7))
            Line((12.5, 3.7), (67.5, 3.7))
            Line((67.5, 3.7), (67.5, 14))
            Line((67.5, 14), (45, 14))
            ThreePointArc((45, 14), (40, 9), (35, 14))
        make_face()
    extrude(amount=CUT_EXTRUDE_19_DEPTH, mode=Mode.SUBTRACT)

    # 草图34 → 切除-拉伸20 (cut)
    with BuildSketch(Plane(origin=(0, 3.7, 0), x_dir=(1, 0, 0), z_dir=(0, 1, 0))):
        with Locations((40, 27.625939444)):
            Rectangle(SKETCH_34_W, SKETCH_34_H)
    extrude(amount=-CUT_EXTRUDE_20_DEPTH, mode=Mode.SUBTRACT)


solid = part.part
